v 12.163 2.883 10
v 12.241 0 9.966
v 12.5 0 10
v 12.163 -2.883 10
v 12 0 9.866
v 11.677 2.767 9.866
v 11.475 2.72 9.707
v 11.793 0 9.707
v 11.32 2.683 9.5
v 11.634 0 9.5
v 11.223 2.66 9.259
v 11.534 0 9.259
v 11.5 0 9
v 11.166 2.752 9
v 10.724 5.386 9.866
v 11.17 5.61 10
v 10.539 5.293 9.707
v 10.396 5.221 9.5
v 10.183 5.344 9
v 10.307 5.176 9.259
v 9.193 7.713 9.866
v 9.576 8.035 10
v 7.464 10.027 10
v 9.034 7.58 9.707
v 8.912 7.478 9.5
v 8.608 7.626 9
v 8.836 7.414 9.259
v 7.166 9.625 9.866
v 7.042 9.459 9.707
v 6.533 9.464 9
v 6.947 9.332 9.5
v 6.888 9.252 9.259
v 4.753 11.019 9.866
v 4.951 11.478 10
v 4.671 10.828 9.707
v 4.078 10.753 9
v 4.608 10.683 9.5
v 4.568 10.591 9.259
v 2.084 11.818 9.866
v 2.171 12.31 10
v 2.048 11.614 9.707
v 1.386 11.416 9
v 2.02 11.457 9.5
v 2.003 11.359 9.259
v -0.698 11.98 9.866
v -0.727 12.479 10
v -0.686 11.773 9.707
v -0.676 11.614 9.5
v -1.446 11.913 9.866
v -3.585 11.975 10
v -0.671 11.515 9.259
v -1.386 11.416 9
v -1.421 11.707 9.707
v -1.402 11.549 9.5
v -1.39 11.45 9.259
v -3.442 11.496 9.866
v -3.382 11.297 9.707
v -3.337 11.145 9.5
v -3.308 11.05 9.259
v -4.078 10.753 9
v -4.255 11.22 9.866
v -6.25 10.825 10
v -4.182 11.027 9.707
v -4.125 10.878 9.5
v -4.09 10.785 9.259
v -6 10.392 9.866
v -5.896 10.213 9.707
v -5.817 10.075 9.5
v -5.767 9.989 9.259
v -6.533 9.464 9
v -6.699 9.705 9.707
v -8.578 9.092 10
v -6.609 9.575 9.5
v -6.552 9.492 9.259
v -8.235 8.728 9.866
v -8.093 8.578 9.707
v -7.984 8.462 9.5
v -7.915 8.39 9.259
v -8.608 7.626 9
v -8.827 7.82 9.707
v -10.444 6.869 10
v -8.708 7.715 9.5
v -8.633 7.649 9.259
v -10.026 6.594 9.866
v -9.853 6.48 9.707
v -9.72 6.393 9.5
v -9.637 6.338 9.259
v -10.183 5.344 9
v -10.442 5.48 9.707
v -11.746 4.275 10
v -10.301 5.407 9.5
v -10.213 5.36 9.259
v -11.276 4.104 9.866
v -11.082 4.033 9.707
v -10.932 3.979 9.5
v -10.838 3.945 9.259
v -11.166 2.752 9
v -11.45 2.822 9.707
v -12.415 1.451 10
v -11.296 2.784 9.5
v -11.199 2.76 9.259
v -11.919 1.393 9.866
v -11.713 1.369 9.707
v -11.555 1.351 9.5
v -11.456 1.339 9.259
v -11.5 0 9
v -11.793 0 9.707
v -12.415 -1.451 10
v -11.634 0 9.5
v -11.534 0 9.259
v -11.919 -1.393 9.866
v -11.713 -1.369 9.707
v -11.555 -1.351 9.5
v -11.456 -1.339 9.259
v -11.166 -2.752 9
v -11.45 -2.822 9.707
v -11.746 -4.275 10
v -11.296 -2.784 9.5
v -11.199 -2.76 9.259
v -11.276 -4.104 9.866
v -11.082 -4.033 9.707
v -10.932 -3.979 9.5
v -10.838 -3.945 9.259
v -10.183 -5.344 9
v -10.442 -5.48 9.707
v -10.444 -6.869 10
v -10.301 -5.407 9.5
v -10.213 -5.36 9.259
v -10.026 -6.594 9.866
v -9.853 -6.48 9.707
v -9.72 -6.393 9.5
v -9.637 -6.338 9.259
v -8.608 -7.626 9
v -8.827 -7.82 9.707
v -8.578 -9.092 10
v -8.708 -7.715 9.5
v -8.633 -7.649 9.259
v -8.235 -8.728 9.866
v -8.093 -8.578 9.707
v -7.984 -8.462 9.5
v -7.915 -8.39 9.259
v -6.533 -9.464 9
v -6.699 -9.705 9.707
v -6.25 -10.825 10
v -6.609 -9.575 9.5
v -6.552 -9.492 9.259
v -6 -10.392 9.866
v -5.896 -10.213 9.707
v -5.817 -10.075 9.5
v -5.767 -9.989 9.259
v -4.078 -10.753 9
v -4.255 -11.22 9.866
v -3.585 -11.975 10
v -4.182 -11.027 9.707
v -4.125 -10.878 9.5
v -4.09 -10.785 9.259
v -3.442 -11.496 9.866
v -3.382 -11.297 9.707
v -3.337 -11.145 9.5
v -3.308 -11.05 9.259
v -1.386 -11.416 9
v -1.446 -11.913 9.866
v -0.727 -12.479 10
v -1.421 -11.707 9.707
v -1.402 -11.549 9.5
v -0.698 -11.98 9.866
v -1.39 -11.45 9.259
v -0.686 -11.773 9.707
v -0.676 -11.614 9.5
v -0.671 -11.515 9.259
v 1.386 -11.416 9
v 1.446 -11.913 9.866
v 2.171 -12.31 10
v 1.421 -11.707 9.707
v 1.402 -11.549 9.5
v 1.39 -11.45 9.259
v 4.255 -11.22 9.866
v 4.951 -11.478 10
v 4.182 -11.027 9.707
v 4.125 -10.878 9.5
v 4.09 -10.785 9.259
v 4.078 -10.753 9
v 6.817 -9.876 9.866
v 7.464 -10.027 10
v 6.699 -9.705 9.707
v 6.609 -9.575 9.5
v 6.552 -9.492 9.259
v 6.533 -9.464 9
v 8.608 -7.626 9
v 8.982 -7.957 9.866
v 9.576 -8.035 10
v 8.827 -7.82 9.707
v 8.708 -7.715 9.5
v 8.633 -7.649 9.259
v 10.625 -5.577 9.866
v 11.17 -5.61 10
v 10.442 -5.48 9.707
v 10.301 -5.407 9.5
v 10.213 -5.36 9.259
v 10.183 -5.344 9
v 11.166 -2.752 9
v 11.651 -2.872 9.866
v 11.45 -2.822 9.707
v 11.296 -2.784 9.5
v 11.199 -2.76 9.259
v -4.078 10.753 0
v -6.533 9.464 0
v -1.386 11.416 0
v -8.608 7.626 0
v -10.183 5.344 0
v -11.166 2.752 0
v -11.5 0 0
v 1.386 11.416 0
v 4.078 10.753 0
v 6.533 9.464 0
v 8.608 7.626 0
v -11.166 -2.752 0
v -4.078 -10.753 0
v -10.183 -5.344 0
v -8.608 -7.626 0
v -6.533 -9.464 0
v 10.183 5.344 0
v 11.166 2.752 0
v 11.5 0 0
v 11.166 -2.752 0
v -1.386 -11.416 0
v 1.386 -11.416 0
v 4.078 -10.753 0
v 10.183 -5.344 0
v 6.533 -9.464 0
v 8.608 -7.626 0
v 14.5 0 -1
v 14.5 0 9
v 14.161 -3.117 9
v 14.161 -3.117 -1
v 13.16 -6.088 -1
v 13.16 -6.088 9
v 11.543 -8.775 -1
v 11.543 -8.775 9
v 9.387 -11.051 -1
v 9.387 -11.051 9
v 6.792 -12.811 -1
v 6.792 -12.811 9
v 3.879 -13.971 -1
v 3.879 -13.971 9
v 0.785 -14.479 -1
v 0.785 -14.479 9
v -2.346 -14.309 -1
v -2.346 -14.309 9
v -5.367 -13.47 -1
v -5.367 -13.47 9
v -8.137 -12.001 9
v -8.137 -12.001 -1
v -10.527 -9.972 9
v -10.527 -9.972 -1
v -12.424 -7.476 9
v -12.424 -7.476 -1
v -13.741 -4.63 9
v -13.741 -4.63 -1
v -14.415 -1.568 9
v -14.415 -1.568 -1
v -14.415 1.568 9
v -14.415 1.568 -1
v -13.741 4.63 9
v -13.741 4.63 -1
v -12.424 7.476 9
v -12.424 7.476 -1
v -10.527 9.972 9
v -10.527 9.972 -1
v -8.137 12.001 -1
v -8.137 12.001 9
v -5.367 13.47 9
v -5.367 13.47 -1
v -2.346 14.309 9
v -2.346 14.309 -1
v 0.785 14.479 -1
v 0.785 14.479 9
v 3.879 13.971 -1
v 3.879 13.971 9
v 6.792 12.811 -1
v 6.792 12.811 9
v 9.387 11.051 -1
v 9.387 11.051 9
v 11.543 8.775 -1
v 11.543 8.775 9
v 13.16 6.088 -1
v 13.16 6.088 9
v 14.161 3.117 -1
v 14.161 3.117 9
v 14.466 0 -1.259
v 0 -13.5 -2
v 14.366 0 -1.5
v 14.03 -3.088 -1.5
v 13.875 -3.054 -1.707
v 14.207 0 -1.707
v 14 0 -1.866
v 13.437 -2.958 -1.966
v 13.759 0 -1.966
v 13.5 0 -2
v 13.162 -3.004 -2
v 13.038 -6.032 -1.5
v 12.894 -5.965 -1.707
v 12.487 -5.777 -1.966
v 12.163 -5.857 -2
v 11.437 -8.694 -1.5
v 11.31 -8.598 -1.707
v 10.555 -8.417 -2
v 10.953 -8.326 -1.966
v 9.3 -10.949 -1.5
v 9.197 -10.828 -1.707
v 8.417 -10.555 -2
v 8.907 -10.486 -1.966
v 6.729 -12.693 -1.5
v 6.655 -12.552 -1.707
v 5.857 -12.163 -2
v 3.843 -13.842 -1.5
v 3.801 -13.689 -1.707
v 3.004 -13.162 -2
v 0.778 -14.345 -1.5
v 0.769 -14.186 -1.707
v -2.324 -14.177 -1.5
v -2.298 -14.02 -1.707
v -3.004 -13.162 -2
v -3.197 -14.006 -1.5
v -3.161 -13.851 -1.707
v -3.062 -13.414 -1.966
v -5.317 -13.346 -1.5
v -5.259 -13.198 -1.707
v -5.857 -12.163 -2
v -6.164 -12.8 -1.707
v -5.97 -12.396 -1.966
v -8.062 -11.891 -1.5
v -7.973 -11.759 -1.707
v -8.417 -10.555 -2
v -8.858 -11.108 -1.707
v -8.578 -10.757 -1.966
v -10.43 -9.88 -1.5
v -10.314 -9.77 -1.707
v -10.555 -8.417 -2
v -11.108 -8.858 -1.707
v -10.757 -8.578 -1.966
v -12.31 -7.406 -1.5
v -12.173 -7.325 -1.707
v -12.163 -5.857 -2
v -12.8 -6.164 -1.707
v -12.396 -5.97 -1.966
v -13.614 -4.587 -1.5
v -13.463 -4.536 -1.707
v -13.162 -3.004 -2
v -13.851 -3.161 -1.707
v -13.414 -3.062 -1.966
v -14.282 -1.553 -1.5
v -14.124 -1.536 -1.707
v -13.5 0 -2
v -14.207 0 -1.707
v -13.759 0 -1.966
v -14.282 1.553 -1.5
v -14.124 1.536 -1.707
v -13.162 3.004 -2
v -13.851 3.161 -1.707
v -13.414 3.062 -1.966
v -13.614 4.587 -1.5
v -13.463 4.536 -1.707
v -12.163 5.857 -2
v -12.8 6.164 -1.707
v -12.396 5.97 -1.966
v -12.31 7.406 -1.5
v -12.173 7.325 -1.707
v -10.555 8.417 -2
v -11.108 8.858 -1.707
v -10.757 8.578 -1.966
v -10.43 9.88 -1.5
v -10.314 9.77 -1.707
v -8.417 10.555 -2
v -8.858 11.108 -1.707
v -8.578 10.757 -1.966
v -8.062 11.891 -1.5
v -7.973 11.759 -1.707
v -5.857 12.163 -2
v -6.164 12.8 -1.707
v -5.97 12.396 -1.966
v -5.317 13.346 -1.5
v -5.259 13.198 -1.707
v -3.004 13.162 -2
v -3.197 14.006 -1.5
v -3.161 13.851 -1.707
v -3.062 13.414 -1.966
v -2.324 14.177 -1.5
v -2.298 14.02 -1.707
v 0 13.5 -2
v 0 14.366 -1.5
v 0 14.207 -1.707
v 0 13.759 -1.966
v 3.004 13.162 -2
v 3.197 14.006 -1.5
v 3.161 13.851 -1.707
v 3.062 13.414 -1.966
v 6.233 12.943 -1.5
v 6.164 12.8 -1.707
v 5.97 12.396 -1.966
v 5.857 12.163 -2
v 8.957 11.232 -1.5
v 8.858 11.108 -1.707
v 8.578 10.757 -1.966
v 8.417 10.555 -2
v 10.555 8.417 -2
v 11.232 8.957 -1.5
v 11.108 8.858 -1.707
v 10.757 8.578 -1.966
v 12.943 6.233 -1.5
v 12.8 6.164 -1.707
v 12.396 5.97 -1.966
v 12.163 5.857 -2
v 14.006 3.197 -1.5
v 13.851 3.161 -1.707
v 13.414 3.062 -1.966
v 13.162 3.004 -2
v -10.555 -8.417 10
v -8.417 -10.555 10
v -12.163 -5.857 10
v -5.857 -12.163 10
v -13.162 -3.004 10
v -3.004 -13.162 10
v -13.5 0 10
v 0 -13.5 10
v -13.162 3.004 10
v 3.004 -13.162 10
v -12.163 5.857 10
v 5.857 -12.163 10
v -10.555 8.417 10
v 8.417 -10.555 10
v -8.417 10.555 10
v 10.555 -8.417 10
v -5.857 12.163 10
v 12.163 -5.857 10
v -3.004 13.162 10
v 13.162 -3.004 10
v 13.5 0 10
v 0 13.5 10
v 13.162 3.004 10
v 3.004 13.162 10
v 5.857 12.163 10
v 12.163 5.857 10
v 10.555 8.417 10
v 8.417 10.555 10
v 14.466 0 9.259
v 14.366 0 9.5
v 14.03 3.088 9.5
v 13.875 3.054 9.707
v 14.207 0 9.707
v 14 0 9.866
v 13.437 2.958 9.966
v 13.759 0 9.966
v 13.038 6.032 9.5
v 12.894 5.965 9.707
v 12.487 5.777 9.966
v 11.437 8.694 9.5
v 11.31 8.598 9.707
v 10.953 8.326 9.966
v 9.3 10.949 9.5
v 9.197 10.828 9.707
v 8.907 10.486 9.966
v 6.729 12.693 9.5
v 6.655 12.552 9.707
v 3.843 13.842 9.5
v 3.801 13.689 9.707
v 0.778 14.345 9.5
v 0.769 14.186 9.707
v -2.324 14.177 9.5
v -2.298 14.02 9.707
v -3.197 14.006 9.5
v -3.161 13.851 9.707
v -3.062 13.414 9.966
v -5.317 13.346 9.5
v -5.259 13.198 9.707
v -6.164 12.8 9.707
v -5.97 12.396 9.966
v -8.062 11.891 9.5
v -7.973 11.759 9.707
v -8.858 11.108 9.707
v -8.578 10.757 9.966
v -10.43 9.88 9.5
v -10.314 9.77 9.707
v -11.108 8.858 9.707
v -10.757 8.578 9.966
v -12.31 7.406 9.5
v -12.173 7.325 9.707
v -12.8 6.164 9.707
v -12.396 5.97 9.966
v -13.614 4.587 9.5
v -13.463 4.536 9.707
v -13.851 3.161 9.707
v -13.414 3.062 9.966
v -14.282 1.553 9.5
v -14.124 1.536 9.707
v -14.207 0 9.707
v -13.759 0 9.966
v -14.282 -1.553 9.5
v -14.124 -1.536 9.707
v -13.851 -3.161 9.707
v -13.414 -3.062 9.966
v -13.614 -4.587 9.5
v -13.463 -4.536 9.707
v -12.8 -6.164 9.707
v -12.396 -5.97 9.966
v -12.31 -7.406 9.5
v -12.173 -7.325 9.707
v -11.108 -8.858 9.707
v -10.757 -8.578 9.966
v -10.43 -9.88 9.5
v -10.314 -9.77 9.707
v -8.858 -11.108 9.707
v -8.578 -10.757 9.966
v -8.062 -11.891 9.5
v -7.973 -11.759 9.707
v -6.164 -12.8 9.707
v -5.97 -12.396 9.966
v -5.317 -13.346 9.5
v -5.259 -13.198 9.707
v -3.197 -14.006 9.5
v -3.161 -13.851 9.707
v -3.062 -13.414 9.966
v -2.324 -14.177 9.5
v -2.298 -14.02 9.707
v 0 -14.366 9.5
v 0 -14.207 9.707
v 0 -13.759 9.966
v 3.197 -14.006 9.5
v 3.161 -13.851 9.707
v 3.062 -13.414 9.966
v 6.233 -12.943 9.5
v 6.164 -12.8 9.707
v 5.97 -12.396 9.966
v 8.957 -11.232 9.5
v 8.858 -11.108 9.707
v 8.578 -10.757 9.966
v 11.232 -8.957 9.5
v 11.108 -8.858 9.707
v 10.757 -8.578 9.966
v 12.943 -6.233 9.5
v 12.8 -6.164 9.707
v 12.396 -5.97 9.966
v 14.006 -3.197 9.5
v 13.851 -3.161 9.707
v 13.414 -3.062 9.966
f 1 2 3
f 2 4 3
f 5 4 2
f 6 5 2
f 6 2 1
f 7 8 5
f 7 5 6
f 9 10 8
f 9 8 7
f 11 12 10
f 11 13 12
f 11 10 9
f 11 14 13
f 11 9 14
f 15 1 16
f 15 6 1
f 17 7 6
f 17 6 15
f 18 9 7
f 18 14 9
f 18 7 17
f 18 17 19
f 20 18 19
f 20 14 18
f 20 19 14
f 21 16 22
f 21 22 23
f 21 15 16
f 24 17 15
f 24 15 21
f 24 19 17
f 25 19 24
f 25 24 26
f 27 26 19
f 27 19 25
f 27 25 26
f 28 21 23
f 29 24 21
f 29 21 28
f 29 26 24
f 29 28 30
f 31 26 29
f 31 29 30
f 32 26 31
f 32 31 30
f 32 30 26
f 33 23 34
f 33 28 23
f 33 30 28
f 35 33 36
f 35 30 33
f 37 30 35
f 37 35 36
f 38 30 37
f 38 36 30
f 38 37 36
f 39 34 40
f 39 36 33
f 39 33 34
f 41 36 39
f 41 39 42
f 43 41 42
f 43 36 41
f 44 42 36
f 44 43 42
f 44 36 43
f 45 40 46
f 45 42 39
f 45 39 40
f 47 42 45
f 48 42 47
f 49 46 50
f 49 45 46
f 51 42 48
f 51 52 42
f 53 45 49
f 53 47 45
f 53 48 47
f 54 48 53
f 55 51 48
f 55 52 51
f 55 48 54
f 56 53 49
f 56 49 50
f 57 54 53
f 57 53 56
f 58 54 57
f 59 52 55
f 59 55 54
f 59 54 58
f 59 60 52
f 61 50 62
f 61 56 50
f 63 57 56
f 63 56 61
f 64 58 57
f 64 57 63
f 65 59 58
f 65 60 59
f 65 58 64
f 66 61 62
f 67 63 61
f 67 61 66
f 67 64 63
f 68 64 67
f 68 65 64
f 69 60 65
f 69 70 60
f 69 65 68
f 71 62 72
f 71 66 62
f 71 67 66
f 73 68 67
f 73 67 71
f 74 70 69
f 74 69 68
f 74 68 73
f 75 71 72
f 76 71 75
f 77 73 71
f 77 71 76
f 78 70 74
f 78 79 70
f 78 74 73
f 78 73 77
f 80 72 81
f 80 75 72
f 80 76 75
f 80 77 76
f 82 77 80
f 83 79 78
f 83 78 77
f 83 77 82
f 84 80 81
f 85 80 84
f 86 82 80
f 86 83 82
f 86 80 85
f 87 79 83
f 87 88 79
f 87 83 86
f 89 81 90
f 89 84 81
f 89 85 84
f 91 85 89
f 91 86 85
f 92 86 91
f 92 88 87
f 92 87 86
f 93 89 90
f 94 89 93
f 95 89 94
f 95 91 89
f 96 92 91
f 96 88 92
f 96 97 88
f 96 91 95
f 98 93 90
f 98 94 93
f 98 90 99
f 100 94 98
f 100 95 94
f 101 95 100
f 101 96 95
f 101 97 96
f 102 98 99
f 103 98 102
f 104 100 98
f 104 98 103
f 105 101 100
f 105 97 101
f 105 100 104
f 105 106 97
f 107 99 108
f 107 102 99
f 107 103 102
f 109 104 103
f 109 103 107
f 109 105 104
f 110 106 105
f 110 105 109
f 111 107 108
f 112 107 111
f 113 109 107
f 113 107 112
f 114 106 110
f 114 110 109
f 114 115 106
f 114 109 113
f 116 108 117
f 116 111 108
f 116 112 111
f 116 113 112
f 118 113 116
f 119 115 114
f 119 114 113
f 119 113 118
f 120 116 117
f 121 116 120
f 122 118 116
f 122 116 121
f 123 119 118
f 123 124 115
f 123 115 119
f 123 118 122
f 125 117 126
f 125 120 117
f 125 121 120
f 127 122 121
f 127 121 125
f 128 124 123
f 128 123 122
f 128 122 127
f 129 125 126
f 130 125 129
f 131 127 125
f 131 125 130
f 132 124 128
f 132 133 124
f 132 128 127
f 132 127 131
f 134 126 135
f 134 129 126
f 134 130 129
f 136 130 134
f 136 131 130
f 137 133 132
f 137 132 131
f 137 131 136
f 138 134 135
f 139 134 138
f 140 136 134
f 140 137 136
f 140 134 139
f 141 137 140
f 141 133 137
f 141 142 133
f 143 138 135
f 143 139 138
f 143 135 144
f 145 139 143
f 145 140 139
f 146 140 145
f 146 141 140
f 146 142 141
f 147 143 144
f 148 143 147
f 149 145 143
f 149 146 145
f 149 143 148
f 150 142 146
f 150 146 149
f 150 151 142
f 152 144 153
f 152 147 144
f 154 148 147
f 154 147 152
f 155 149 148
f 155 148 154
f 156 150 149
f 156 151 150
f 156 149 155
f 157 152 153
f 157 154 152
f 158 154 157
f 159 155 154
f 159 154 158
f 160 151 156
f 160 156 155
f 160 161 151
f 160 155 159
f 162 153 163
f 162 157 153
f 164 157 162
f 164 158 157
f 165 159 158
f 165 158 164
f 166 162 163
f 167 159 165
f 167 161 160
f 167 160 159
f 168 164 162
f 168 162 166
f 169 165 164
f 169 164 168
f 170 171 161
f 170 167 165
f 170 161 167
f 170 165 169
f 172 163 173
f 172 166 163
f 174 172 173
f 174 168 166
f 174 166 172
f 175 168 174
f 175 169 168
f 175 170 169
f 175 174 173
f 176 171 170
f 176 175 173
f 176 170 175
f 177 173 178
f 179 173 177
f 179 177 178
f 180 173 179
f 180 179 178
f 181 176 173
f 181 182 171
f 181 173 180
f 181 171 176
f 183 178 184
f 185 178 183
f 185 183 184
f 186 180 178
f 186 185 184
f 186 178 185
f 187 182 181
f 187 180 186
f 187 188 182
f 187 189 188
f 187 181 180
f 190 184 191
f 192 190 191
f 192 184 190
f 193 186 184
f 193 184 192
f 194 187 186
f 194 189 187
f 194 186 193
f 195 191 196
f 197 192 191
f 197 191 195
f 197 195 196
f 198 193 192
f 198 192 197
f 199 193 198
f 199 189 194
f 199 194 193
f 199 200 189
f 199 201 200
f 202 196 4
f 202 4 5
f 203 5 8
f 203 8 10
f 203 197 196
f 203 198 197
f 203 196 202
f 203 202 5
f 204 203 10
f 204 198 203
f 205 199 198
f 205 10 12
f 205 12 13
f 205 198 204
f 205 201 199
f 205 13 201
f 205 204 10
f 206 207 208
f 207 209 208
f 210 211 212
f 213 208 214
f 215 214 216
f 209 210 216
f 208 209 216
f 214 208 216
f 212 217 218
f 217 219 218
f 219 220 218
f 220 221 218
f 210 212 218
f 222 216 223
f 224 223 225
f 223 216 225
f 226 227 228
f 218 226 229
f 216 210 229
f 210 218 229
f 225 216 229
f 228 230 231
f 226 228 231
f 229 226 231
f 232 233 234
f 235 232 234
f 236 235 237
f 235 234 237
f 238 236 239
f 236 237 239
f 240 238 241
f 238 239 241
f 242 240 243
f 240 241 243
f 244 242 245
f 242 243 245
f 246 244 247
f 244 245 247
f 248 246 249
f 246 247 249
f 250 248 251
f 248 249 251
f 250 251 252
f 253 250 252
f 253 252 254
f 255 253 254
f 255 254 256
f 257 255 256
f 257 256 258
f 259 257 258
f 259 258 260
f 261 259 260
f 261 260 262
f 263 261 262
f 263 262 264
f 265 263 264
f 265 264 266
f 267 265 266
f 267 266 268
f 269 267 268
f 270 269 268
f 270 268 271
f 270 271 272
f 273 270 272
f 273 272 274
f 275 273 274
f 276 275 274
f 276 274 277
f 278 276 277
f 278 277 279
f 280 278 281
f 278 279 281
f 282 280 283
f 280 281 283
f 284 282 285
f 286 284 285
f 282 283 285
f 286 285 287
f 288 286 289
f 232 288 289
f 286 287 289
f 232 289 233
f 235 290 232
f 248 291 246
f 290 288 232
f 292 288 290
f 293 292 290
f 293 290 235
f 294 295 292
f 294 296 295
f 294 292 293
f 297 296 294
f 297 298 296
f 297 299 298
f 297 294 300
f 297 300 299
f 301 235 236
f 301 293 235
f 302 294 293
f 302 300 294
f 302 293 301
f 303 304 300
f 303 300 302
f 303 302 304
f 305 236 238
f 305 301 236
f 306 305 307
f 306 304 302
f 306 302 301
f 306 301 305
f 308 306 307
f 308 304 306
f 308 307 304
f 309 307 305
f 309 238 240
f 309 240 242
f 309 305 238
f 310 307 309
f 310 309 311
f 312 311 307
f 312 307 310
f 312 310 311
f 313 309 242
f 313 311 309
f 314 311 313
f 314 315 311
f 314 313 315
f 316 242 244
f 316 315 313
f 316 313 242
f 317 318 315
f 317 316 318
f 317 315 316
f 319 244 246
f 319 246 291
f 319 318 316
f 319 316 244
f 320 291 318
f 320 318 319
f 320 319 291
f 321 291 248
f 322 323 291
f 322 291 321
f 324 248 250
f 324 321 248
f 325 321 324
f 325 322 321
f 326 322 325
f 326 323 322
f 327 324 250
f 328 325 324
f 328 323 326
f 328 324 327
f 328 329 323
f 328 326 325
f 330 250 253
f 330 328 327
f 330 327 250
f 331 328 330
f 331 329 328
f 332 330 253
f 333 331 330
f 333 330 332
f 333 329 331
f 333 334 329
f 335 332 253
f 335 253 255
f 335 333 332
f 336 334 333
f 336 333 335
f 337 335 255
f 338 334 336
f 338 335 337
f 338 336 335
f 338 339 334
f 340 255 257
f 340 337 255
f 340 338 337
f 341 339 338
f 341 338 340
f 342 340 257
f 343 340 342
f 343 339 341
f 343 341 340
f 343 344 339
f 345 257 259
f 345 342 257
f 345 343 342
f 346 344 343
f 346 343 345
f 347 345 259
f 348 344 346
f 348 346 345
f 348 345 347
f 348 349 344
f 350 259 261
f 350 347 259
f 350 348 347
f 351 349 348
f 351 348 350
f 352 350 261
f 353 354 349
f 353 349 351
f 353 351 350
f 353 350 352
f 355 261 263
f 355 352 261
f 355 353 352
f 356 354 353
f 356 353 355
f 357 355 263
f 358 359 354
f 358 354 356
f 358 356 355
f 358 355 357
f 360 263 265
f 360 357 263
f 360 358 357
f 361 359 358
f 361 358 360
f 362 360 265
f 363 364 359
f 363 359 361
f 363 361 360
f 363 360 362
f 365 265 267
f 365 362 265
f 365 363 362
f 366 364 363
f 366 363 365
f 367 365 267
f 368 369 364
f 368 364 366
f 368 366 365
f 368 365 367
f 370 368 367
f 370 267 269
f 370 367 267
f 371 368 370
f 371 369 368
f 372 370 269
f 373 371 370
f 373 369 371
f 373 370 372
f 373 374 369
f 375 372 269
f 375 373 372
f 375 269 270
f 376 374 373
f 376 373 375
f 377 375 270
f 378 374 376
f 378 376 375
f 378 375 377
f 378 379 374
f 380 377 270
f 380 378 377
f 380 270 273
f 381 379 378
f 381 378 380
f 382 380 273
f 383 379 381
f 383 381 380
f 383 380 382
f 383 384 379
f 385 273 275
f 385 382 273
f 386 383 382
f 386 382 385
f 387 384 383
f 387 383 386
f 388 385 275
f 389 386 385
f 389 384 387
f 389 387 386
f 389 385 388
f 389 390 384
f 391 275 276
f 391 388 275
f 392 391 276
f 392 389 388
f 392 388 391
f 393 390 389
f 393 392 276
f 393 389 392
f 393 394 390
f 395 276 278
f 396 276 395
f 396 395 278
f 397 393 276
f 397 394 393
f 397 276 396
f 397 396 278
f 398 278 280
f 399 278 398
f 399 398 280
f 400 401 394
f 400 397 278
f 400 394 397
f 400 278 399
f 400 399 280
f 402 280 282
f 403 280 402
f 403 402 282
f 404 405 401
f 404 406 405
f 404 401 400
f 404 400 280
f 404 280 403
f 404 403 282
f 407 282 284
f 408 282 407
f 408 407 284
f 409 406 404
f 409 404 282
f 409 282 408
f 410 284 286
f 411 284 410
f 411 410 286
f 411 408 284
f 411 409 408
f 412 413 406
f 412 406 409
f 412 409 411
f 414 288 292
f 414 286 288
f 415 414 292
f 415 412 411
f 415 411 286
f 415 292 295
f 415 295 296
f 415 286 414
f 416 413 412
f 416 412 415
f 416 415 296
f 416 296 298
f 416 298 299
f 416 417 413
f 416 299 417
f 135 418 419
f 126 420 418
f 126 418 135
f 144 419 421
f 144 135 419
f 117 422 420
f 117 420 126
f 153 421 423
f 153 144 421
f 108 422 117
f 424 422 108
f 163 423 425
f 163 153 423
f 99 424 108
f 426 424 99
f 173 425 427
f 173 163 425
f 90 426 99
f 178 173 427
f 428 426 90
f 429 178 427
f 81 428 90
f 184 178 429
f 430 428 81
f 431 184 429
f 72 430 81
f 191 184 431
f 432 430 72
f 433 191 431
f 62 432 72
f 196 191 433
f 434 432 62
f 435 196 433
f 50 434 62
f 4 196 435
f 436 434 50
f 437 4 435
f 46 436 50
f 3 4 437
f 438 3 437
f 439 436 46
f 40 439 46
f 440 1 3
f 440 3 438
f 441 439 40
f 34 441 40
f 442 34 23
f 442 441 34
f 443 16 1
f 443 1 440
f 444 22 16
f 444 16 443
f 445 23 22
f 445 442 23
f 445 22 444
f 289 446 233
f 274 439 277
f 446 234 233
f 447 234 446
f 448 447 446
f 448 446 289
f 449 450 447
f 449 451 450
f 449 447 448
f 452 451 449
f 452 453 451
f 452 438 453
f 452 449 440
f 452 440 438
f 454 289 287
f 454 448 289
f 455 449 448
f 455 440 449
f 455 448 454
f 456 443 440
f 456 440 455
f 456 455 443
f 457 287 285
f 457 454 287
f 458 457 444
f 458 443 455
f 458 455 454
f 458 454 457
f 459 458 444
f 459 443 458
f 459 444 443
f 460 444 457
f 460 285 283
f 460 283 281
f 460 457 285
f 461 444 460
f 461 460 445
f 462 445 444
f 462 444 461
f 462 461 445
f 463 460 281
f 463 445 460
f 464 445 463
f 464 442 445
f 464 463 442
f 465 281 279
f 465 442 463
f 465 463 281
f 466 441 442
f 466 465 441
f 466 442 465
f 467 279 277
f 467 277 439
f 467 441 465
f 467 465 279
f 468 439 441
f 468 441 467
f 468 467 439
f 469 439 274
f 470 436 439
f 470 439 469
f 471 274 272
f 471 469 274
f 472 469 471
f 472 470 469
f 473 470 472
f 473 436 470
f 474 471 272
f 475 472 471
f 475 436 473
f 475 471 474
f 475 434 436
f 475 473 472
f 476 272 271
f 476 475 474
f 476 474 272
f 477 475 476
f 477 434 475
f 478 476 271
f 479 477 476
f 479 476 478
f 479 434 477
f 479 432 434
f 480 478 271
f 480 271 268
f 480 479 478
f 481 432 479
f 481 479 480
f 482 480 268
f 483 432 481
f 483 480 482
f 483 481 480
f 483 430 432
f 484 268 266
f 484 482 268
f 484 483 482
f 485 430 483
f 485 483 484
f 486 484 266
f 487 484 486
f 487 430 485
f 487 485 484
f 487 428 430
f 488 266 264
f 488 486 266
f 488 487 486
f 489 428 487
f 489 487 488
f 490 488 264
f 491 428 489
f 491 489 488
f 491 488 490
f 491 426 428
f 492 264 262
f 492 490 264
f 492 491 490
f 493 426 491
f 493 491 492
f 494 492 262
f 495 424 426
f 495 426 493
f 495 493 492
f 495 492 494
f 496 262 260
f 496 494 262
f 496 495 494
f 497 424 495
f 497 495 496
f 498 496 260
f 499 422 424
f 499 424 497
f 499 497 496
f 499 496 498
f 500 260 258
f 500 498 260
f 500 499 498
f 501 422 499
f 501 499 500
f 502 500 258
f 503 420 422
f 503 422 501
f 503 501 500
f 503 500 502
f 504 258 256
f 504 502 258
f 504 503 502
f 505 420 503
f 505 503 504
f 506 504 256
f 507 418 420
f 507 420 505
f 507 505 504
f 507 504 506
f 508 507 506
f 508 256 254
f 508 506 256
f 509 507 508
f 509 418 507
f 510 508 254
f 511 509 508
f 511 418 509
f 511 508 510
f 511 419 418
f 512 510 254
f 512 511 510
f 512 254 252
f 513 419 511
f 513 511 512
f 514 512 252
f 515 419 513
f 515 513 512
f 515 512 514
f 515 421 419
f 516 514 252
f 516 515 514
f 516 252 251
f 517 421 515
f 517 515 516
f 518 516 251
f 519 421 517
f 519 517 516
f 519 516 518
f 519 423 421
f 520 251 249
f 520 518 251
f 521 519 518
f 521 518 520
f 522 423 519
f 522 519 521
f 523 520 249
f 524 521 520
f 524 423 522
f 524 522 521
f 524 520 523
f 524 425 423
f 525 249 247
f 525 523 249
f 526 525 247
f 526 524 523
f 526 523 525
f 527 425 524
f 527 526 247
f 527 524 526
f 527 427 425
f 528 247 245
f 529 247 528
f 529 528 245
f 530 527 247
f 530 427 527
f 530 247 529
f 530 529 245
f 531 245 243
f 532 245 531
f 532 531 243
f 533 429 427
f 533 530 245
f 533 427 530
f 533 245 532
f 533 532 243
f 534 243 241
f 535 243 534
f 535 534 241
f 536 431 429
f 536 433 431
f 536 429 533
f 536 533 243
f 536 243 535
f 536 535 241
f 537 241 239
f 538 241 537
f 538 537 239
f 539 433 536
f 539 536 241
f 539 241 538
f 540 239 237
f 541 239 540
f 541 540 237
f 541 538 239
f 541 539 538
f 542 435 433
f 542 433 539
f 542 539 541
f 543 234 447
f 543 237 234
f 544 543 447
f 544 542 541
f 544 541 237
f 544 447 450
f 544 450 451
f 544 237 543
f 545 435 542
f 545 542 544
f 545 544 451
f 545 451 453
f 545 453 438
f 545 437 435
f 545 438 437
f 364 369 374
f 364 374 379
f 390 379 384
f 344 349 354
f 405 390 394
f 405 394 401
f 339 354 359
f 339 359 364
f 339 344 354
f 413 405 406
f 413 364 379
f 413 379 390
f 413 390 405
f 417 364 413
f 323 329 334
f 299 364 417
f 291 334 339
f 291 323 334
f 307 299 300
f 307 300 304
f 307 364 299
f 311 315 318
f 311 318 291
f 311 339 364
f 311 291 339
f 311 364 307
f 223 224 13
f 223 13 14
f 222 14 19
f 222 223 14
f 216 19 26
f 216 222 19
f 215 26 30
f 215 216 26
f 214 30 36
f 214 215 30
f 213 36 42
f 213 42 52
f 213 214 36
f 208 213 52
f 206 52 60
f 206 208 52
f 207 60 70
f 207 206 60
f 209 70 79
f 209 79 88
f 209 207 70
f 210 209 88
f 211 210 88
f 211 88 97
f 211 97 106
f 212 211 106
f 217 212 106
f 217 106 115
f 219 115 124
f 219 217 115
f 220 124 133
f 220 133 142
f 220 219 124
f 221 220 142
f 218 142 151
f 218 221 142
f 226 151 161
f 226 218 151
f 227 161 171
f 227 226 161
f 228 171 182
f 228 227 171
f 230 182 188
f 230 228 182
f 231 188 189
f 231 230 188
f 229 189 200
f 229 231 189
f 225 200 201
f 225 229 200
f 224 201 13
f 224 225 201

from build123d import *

# Parameters (mm, degrees)
F0_R     = 14.5
F0_R_2   = 11.5
F1_DEPTH = 10
F2_R     = 14.5
F3_DEPTH = 2
F4_R     = 1


with BuildPart() as f1:
    # F0 (on Top) → F1 (new body)
    with BuildSketch(Plane.XY):
        Circle(F0_R)
        Circle(F0_R_2, mode=Mode.SUBTRACT)
    extrude(amount=F1_DEPTH)

    # F2 (on face) → F3 (join)
    with BuildSketch(Plane(origin=(0, 0, 0), x_dir=(1, 0, 0), z_dir=(0, 0, -1))):
        Circle(F2_R)
    extrude(amount=F3_DEPTH)

    # F4
    f4_edges = [f1.edges().sort_by_distance(p)[0] for p in [
        (-14.5, 0, 10),
        (-11.5, 0, 10),
        (-14.5, 0, -2),
    ]]
    fillet(f4_edges, radius=F4_R)


solid = f1.part
